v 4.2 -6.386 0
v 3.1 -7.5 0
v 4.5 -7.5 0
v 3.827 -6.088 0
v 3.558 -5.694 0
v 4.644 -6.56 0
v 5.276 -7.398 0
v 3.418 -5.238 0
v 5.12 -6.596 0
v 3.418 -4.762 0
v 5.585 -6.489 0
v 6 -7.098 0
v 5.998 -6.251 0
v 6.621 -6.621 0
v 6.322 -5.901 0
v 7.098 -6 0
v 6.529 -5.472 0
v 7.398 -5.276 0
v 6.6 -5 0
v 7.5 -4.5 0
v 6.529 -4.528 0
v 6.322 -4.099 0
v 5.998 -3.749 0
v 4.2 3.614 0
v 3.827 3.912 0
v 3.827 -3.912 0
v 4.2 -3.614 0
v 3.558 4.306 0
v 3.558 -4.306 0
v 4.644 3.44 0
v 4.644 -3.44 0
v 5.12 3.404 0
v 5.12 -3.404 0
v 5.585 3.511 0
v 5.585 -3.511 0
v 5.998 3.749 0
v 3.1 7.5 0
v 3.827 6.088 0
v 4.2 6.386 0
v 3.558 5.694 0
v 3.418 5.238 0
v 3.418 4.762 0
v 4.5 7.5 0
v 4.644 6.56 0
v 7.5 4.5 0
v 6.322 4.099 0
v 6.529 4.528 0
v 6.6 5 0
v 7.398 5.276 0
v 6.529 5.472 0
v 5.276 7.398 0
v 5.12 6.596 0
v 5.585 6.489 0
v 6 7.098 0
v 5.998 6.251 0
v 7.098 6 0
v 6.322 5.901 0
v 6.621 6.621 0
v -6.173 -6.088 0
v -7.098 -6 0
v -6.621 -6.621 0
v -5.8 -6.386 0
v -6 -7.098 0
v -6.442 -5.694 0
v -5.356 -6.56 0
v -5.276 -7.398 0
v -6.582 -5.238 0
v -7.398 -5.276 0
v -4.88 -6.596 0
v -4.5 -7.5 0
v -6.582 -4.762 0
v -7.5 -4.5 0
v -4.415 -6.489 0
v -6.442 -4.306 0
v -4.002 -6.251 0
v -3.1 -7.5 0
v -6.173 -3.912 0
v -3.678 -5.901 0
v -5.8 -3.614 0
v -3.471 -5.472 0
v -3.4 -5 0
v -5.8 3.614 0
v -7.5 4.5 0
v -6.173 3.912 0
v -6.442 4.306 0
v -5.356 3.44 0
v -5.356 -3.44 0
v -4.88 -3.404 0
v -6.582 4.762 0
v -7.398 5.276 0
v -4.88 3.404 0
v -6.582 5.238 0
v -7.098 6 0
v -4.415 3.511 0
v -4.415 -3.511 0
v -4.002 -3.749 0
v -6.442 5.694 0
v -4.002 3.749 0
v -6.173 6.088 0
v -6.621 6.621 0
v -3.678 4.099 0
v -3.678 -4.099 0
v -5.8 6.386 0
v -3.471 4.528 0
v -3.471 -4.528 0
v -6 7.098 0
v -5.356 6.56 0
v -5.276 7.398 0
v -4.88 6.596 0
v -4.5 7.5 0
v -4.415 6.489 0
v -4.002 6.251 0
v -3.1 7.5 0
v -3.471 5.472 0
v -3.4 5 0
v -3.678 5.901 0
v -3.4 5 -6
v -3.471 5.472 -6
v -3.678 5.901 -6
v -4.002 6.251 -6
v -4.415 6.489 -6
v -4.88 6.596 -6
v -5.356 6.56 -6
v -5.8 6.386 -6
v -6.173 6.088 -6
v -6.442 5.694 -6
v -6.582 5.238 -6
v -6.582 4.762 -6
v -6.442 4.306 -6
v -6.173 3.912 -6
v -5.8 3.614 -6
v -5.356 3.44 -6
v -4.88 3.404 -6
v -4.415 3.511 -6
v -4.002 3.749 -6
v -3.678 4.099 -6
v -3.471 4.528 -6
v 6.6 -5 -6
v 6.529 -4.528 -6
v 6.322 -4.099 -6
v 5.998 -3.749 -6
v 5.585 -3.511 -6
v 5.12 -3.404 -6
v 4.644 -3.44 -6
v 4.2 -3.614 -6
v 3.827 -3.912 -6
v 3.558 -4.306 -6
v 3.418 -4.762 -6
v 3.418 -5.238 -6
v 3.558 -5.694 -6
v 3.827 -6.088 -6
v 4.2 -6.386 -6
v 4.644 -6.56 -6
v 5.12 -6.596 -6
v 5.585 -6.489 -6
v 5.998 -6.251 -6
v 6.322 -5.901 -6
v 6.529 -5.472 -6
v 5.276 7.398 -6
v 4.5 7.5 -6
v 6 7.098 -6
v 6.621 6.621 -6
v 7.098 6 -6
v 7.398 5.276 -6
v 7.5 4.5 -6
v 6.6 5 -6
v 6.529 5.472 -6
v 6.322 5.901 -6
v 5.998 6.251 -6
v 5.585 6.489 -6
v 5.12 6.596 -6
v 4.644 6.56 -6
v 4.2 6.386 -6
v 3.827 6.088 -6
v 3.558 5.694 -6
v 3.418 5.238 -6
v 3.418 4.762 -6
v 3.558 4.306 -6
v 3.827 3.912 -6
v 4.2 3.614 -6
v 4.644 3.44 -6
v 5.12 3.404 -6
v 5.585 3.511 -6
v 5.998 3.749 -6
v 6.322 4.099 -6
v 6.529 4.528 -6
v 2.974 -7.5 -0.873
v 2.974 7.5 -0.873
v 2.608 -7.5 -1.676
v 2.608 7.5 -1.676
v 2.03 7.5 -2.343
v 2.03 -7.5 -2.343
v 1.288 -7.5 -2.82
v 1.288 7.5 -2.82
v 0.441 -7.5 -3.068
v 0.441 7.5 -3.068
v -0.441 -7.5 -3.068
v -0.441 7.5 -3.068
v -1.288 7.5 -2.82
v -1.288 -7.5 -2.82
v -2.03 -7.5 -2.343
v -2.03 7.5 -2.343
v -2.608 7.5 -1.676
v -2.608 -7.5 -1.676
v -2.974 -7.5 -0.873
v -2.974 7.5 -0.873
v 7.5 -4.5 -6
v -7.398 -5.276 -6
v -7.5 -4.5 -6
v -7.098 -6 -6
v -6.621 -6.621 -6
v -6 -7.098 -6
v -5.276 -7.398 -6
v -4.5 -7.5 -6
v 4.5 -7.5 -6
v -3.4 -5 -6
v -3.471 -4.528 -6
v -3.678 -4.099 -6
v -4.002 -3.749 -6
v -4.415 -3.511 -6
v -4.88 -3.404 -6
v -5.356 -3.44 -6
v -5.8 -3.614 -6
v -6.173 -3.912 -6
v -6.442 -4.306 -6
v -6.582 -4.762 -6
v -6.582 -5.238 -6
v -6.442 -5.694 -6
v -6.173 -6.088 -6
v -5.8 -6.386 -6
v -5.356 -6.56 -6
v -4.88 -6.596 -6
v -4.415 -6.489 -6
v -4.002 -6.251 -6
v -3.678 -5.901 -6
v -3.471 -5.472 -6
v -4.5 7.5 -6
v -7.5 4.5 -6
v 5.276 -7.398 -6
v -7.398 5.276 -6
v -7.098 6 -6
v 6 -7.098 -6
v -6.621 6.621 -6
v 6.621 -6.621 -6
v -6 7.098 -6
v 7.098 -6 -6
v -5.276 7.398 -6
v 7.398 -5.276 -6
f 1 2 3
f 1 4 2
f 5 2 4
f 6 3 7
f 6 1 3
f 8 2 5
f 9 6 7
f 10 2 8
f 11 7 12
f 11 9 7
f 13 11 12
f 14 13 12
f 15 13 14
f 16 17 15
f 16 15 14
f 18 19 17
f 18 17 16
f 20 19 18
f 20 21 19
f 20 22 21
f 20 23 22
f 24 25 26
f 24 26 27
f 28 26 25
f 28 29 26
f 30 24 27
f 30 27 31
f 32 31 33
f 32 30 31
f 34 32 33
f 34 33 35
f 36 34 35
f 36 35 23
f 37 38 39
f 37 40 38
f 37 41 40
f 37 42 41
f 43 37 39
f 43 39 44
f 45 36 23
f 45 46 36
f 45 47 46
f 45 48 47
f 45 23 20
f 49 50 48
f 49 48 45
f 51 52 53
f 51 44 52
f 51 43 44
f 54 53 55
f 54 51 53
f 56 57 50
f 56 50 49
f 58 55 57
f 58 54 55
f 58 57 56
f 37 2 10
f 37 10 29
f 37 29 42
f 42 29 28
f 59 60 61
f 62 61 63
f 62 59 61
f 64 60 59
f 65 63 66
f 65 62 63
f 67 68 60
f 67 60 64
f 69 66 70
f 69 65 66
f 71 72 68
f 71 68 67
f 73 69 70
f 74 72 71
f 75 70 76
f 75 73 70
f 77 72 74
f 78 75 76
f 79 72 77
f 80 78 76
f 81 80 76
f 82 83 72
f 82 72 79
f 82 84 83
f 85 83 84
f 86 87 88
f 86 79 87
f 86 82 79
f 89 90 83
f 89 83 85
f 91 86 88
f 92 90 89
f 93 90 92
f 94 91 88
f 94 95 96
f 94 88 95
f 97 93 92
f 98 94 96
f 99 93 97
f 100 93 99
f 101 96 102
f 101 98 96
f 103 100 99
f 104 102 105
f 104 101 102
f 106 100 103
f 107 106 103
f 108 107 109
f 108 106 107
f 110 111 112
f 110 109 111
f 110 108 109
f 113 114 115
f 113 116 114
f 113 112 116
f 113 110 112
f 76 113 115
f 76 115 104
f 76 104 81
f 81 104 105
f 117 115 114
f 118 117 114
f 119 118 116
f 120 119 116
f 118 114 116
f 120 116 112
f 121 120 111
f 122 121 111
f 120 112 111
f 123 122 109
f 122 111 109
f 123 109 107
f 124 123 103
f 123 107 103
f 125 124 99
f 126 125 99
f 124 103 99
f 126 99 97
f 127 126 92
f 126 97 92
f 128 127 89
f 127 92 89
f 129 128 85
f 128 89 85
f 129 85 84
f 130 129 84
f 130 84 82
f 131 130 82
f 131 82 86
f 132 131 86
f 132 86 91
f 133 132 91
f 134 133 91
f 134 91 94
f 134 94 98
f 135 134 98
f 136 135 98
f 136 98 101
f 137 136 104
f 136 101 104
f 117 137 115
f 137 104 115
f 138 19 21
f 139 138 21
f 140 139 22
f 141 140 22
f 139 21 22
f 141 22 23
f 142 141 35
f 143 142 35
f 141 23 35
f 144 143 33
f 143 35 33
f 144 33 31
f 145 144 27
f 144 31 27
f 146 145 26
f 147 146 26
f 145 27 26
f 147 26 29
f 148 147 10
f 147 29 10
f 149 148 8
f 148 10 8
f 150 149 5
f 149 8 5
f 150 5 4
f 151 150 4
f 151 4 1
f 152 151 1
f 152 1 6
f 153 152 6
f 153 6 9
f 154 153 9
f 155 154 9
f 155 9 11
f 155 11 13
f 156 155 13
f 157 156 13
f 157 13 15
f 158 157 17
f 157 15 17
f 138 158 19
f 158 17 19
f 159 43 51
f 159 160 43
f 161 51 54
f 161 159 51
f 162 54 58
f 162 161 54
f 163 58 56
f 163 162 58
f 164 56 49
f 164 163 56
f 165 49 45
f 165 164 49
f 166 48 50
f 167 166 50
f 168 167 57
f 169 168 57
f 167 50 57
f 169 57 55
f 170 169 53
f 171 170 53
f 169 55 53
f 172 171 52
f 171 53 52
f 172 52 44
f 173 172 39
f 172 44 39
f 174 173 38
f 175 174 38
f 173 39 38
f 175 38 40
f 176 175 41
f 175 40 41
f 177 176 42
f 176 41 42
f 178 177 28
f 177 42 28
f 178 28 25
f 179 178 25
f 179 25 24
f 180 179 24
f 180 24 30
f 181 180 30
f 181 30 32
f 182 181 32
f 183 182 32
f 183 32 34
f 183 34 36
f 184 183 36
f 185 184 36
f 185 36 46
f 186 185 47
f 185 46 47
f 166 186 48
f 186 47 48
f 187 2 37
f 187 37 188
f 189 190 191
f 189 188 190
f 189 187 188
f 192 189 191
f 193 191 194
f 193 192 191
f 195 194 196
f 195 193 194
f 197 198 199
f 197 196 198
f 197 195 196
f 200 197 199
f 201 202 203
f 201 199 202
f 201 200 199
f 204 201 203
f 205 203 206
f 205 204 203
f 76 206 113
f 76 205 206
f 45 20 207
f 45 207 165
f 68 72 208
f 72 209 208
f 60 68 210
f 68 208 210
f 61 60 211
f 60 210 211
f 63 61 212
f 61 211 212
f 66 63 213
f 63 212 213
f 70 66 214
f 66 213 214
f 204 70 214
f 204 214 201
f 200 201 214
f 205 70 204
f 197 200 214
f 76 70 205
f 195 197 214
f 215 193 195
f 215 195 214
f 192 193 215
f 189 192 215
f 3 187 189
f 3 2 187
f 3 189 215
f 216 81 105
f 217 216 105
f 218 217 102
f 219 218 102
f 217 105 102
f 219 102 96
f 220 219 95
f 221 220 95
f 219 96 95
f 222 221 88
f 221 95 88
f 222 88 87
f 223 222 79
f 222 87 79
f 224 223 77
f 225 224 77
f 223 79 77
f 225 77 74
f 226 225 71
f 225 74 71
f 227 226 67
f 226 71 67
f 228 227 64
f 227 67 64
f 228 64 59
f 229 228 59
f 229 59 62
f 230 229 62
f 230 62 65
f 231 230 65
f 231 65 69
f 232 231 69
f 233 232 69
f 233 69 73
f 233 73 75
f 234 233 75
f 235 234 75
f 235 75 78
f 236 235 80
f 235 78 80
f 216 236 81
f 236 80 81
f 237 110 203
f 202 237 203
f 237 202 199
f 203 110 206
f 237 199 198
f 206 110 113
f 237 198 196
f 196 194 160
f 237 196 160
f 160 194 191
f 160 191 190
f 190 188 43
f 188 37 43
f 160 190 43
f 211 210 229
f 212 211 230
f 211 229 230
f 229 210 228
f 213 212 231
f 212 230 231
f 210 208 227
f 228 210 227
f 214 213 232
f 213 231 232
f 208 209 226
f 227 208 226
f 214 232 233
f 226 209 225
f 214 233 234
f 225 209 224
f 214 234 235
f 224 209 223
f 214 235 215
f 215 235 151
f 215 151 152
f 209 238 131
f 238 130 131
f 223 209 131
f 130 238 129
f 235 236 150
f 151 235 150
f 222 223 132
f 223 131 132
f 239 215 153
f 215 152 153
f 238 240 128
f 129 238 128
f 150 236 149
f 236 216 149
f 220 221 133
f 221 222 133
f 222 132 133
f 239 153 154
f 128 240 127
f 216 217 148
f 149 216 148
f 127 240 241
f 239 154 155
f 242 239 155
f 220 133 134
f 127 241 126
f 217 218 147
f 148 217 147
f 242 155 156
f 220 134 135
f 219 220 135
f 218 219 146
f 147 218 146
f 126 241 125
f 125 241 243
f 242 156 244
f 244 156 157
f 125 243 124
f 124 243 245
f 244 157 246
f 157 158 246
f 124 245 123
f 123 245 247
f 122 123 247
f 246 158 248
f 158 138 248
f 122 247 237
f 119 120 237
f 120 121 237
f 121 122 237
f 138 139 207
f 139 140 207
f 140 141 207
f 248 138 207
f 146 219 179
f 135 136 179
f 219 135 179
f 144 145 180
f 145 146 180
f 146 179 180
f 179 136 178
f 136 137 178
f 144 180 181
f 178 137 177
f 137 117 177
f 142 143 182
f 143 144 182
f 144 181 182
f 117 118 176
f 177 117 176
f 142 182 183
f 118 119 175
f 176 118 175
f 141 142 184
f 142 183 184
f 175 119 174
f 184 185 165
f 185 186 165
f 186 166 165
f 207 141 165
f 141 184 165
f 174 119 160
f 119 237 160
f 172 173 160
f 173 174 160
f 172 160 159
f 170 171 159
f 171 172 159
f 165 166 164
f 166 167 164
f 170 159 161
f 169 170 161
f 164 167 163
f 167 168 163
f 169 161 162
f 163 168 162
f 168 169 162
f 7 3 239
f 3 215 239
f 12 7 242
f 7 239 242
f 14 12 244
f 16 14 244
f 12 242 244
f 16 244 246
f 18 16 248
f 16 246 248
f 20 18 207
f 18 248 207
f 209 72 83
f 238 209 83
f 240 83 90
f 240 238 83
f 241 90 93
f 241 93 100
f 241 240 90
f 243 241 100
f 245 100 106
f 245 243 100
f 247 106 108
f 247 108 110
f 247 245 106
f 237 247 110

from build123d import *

# Parameters (mm, degrees)
SKIZZE1_W                            = 15
SKIZZE1_H                            = 15
SKIZZE1_R                            = 1.6
AUFSATZ_LINEAR_AUSTRAGEN1_DEPTH      = 6
SCHNITT_LINEAR_AUSTRAGEN1_DEPTH      = 13.186057607
SCHNITT_LINEAR_AUSTRAGEN1_DEPTH_BACK = 13.186057607
SKIZZE2_R                            = 3.1
VERRUNDUNG1_R                        = 3


with BuildPart() as part:
    # Skizze1 → Aufsatz-Linear austragen1 (new body)
    with BuildSketch(Plane.XY):
        Rectangle(SKIZZE1_W, SKIZZE1_H)
        with Locations((5, 5)):
            Circle(SKIZZE1_R, mode=Mode.SUBTRACT)
        with Locations((-5, 5)):
            Circle(SKIZZE1_R, mode=Mode.SUBTRACT)
        with Locations((-5, -5)):
            Circle(SKIZZE1_R, mode=Mode.SUBTRACT)
        with Locations((5, -5)):
            Circle(SKIZZE1_R, mode=Mode.SUBTRACT)
    extrude(amount=-AUFSATZ_LINEAR_AUSTRAGEN1_DEPTH)

    # Skizze2 → Schnitt-Linear austragen1 (cut, two sides: drawn at the far end of the back side and taken through both)
    with BuildSketch(Plane(origin=(0, 0, 0), x_dir=(1, 0, 0), z_dir=(0, 1, 0)).offset(-SCHNITT_LINEAR_AUSTRAGEN1_DEPTH_BACK)):
        Circle(SKIZZE2_R)
    extrude(amount=SCHNITT_LINEAR_AUSTRAGEN1_DEPTH + SCHNITT_LINEAR_AUSTRAGEN1_DEPTH_BACK, mode=Mode.SUBTRACT)

    # Verrundung1
    verrundung1_edges = [part.edges().sort_by_distance(p)[0] for p in [
        (-7.5, 7.5, -3),
        (7.5, 7.5, -3),
        (7.5, -7.5, -3),
        (-7.5, -7.5, -3),
    ]]
    fillet(verrundung1_edges, radius=VERRUNDUNG1_R)


solid = part.part
